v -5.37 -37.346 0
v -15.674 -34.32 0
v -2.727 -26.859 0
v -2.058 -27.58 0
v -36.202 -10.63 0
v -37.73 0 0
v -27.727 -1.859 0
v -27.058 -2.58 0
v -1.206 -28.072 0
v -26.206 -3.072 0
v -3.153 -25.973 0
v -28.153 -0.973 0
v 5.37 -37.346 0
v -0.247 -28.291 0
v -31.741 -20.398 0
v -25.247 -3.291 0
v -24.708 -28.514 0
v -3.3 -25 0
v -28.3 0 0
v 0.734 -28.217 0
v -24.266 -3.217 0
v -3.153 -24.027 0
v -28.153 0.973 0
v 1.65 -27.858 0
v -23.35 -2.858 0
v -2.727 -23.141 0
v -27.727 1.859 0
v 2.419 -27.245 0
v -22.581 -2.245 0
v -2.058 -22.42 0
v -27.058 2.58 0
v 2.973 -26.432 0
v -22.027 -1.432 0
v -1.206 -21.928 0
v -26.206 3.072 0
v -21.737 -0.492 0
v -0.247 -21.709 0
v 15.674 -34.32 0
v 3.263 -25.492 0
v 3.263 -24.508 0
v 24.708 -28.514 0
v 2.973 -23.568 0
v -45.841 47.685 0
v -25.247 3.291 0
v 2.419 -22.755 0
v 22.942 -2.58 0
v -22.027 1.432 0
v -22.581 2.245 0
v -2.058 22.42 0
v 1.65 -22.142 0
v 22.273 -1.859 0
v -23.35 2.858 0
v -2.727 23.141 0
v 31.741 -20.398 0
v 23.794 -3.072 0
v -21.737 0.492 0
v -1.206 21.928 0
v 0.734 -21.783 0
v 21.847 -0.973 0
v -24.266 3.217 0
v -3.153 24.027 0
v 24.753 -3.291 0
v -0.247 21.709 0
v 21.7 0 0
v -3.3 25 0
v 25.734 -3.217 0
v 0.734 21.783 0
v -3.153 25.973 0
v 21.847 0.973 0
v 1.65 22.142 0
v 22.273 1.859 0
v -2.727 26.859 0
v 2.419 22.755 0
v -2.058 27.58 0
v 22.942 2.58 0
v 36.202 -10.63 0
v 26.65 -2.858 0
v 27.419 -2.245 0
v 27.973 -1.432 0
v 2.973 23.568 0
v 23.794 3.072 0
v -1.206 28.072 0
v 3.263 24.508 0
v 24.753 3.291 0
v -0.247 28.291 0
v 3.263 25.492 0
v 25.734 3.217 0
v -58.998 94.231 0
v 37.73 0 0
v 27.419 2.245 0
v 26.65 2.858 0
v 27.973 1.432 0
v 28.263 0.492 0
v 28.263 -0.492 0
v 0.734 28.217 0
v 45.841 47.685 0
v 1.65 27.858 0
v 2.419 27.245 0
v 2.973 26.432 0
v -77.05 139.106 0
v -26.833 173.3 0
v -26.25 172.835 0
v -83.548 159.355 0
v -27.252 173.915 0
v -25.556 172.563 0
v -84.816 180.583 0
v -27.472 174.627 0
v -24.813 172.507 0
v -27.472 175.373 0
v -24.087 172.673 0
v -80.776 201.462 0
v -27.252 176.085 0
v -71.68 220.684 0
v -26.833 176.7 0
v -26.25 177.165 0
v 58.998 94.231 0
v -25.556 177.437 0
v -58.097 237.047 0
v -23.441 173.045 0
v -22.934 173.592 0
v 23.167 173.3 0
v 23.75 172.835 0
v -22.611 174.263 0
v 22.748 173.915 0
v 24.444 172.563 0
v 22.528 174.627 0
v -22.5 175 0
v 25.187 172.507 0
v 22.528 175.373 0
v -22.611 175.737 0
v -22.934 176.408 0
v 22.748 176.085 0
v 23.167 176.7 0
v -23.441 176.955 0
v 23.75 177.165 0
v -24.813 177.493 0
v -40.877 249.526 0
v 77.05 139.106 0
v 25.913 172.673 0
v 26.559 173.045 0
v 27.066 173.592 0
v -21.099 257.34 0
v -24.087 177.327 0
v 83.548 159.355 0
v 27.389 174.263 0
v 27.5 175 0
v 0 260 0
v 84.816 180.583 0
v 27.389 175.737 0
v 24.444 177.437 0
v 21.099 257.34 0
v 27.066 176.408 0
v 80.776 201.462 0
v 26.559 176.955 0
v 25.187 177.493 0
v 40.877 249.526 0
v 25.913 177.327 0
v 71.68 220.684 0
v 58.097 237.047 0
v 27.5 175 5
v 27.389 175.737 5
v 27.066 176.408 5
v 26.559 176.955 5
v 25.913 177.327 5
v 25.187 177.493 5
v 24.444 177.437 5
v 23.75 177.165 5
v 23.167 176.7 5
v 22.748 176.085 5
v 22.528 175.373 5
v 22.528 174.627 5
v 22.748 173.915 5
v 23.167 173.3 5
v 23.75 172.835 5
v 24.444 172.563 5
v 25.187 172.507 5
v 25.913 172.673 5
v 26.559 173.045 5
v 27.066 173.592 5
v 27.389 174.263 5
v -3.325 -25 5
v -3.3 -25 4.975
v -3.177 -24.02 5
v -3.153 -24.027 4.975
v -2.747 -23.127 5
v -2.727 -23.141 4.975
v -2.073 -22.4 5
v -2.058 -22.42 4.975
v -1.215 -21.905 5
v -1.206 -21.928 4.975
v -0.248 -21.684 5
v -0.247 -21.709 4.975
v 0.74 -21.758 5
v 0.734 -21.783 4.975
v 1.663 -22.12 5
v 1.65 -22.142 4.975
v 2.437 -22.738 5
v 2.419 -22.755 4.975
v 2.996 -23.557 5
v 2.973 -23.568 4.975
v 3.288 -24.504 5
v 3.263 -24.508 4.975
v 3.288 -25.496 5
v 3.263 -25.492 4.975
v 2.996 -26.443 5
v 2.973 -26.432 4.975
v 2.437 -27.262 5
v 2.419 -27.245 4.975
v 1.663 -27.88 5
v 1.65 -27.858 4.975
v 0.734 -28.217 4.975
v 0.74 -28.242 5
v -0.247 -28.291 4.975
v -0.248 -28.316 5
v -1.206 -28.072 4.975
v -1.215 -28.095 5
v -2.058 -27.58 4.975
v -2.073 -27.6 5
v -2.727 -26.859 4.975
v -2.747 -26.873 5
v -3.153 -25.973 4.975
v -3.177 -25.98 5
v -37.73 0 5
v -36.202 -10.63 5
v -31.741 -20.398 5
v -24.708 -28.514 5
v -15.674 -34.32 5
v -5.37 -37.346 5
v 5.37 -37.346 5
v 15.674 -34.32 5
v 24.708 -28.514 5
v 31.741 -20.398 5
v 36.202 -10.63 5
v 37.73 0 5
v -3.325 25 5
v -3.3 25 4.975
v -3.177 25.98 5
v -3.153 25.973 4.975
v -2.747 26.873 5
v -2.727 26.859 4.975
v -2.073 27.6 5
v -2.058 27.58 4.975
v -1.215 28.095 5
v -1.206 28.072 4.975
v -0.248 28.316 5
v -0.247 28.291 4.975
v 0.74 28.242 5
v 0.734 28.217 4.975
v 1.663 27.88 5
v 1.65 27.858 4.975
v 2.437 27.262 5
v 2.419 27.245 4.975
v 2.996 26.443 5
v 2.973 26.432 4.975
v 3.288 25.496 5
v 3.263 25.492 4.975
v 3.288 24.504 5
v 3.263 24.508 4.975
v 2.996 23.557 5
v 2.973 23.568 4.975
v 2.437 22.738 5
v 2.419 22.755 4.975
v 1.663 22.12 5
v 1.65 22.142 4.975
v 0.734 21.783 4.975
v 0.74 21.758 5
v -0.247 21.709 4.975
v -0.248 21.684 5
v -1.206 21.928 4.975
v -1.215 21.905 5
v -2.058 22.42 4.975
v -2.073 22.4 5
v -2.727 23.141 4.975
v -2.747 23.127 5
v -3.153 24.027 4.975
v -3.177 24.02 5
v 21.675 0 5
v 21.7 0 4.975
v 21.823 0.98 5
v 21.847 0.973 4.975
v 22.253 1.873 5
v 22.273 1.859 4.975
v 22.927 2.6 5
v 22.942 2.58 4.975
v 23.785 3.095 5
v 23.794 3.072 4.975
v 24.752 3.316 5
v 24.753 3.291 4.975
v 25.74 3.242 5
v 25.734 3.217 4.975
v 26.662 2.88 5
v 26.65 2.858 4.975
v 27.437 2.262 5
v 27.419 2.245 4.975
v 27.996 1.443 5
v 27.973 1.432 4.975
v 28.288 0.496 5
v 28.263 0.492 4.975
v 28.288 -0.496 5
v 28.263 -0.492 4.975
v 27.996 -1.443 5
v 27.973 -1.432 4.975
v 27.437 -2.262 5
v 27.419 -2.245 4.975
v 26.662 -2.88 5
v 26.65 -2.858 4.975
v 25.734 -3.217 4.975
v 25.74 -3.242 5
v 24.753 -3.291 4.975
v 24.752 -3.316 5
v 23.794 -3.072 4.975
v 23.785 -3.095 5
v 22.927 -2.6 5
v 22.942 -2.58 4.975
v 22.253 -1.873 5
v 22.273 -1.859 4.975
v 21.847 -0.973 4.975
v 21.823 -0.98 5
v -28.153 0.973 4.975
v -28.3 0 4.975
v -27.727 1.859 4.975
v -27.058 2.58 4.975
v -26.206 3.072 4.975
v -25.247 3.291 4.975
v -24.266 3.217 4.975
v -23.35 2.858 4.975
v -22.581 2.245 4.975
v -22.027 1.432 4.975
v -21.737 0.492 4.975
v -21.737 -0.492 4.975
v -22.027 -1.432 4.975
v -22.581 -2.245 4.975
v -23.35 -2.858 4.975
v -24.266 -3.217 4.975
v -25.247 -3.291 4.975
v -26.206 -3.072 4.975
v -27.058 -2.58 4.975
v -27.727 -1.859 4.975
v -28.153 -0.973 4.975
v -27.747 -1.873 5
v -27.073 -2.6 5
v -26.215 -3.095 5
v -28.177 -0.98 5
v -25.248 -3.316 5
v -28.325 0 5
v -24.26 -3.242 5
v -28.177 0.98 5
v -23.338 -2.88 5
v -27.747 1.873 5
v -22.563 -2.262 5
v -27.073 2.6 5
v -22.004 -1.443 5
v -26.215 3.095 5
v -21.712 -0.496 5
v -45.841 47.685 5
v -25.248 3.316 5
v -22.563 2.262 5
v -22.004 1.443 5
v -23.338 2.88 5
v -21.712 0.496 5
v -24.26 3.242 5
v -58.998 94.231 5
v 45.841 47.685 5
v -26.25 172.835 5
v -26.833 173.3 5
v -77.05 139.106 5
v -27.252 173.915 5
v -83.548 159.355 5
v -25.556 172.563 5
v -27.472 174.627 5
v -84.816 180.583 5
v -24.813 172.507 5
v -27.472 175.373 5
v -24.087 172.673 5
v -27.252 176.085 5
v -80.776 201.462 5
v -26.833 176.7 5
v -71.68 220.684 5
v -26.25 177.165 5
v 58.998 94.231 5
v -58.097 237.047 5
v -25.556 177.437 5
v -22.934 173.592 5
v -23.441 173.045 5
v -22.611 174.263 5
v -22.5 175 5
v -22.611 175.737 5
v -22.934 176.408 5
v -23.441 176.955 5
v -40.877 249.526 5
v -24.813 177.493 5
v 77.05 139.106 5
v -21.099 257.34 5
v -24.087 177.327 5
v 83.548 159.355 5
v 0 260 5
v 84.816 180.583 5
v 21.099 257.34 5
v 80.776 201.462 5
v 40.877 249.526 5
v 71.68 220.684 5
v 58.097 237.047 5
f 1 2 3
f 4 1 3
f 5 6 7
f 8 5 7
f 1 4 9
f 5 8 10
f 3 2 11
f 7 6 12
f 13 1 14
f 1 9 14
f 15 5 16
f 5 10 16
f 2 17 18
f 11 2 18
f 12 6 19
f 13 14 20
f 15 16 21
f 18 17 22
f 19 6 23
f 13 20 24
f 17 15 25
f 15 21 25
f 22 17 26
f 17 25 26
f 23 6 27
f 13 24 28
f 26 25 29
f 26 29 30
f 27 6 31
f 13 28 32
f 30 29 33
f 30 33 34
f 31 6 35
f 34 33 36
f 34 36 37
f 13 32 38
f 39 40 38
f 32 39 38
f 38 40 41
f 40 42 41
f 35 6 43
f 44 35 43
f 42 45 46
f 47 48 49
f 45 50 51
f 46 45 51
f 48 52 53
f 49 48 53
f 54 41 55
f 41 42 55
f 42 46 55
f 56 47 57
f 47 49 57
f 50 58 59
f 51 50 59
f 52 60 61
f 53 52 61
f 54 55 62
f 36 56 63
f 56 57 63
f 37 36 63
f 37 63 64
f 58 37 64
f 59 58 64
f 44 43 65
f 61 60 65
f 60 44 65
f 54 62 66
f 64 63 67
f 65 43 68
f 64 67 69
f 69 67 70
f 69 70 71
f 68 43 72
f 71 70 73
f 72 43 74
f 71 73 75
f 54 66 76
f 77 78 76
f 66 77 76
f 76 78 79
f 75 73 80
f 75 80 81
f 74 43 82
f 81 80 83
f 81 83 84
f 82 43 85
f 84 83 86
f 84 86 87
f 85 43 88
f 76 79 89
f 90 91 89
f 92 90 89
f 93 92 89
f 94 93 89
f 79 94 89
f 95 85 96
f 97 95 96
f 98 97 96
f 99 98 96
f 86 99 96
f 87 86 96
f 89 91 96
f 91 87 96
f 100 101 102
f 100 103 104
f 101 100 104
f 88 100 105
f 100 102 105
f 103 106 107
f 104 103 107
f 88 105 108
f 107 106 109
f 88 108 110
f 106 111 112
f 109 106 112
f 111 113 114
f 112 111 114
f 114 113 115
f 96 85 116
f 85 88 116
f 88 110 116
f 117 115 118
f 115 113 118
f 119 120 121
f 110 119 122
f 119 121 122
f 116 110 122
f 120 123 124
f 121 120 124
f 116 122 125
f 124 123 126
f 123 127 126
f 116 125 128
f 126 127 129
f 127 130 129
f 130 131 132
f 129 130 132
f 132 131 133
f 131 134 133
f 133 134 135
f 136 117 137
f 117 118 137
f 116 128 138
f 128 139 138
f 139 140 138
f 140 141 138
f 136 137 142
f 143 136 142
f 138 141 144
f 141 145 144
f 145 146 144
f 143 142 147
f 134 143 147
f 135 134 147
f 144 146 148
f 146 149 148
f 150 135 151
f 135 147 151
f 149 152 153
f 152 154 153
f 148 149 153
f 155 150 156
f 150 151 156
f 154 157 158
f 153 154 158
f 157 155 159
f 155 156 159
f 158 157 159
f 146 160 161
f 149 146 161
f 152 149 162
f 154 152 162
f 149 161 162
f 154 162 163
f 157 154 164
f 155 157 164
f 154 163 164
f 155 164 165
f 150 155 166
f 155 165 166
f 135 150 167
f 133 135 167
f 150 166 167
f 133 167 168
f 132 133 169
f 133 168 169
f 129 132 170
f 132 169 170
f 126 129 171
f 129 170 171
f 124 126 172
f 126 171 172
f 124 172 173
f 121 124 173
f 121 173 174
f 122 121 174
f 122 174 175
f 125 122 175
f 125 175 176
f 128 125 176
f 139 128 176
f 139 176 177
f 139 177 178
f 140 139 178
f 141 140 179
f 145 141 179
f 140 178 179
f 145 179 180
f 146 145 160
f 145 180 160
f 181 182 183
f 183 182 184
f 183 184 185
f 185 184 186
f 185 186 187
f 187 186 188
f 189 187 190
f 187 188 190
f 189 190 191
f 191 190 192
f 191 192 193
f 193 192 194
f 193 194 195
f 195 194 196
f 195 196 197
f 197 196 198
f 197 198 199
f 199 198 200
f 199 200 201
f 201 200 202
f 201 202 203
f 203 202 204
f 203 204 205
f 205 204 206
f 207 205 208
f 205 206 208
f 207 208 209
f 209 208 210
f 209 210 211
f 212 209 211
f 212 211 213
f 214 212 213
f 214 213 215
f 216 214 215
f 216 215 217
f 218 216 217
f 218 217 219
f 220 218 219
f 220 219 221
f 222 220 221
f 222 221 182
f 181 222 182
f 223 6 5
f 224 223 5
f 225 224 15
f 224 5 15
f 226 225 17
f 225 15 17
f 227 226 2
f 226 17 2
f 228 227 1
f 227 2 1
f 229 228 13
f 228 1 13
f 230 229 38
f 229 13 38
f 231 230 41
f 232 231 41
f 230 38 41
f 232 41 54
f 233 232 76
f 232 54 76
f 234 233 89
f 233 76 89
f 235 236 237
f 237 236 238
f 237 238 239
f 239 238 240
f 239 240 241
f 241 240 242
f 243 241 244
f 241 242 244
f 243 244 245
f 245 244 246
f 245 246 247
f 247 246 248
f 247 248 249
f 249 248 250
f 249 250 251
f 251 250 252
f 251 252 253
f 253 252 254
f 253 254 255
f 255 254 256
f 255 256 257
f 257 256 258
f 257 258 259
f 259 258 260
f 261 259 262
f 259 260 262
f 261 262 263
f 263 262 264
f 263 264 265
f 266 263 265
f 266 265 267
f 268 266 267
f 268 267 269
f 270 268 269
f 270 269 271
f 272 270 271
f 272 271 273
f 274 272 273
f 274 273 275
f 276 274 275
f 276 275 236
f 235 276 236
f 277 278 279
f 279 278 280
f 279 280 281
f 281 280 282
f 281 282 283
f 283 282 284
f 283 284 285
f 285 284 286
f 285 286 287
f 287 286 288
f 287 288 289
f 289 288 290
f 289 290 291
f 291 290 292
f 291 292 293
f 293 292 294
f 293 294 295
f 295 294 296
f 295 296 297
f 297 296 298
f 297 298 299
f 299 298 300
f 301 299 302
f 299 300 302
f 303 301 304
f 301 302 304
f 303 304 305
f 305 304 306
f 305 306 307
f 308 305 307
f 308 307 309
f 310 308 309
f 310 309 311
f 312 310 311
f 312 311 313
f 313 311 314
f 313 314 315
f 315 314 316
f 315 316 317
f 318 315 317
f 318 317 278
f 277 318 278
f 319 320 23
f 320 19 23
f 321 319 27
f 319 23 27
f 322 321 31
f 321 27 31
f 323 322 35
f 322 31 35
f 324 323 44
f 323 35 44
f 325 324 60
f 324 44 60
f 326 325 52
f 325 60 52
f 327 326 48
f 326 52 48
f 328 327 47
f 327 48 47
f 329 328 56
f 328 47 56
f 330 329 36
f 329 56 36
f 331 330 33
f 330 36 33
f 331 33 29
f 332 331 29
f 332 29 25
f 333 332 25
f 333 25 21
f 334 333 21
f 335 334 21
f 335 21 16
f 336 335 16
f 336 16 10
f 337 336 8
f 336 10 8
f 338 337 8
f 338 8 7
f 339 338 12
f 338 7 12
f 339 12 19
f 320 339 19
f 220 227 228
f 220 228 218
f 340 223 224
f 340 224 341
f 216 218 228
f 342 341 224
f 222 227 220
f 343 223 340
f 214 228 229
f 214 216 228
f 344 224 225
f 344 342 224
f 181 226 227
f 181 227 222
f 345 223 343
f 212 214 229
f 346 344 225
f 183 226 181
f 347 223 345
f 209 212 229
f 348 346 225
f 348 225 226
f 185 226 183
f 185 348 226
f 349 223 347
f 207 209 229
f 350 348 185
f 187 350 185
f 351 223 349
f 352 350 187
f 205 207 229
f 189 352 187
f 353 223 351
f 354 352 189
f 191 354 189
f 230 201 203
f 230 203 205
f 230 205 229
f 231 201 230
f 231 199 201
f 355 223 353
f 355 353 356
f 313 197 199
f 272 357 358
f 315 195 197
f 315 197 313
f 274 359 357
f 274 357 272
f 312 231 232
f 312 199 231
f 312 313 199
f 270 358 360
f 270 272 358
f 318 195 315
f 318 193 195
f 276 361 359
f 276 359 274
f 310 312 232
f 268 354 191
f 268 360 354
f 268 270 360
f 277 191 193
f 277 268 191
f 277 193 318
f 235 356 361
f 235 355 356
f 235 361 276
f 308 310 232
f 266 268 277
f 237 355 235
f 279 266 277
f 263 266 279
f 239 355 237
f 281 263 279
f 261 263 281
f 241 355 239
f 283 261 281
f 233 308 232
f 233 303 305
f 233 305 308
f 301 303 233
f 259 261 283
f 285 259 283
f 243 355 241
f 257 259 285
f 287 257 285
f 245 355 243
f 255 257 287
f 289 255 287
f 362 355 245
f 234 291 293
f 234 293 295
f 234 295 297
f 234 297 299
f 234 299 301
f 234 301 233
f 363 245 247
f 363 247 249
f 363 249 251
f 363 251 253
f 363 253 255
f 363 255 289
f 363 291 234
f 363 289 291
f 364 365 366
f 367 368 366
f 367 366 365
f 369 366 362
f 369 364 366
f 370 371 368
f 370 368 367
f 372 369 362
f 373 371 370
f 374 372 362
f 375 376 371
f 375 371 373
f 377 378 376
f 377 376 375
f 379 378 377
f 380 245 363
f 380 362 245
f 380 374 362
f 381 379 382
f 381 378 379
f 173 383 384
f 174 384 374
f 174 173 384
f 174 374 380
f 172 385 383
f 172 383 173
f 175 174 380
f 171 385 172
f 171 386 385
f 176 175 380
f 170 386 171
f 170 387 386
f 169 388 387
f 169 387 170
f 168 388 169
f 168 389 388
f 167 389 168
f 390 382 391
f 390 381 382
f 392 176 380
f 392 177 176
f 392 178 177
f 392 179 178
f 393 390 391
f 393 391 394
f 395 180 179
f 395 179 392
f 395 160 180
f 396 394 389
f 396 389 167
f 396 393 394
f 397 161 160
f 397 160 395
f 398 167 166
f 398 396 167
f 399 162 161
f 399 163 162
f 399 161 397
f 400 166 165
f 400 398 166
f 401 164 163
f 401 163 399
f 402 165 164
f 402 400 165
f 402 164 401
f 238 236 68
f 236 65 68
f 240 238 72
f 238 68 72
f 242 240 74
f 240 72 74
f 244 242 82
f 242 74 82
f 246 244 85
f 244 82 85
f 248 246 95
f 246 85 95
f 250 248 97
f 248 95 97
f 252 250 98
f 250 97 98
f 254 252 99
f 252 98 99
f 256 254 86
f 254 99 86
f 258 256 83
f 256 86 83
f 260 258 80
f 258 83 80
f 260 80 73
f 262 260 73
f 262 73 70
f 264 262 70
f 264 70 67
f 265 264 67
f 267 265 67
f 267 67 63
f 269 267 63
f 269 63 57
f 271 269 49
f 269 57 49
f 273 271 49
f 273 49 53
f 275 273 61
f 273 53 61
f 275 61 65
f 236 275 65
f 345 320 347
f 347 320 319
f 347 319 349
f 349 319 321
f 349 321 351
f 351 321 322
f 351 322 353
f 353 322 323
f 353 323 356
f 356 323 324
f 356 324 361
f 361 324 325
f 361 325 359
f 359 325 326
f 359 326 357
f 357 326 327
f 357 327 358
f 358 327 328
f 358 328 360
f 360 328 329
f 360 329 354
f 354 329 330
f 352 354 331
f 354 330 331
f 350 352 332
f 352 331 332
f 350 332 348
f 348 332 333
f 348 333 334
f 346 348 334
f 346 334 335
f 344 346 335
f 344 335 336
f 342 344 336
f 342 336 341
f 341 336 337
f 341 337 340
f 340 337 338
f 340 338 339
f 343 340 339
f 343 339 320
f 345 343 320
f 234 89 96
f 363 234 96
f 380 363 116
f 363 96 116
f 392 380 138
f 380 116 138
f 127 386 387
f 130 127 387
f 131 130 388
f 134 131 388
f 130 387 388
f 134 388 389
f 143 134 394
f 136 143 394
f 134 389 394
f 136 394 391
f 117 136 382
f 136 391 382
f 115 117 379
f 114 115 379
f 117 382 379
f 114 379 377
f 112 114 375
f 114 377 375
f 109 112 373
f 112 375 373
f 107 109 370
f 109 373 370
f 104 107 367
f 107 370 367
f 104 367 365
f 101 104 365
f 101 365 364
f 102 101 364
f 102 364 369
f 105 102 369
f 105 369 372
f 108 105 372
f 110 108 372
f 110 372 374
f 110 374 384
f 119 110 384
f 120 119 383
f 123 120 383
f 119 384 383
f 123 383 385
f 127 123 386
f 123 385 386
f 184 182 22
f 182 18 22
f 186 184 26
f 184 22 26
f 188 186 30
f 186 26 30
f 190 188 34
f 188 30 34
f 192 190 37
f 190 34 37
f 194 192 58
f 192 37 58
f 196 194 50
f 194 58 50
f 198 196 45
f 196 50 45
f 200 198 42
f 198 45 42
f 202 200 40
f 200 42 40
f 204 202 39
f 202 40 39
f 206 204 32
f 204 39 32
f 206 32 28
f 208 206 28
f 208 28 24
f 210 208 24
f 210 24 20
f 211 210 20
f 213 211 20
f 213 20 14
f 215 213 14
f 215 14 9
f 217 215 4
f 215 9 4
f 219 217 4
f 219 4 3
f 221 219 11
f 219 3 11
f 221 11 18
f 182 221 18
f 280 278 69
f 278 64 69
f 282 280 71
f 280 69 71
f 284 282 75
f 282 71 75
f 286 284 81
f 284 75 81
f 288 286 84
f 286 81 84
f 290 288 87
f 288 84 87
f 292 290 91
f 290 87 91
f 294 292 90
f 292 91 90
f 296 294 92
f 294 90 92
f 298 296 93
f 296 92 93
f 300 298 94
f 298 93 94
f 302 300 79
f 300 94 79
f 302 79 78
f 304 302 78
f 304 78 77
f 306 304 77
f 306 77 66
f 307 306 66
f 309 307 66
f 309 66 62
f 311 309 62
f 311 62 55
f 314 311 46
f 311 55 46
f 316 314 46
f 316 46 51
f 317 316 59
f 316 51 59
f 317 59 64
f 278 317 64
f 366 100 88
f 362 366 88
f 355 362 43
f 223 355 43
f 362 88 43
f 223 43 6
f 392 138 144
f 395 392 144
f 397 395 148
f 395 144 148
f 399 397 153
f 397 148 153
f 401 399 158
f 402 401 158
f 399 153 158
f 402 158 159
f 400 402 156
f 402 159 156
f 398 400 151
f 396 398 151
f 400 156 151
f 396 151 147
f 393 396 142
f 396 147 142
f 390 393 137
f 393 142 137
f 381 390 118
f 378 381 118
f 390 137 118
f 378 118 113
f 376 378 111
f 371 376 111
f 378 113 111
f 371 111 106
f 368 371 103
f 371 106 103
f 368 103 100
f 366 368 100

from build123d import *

# Parameters (mm, degrees)
BOSS_EXTRUDE4_DEPTH            = 5
M6_CLEARANCE_HOLE1_D           = 6.6
M6_CLEARANCE_HOLE1_CSINK_D     = 6.65
M6_CLEARANCE_HOLE1_CSINK_ANGLE = 90
SKETCH10_R                     = 2.5
CUT_EXTRUDE1_DEPTH             = 5


with BuildPart() as part:
    # Sketch6 → Boss-Extrude4 (new body)
    with BuildSketch(Plane.XY):
        with BuildLine():
            ThreePointArc((37.730032203, 0), (51.79672204, 71.134128832), (77.049643457, 139.106373223))
            ThreePointArc((77.049643457, 139.106373223), (0, 260), (-77.049643457, 139.106373223))
            ThreePointArc((-77.049643457, 139.106373223), (-51.79672204, 71.134128832), (-37.730032203, 0))
            ThreePointArc((-37.730032203, 0), (0, -37.730032203), (37.730032203, 0))
        make_face()
    extrude(amount=BOSS_EXTRUDE4_DEPTH)

    # M6 Clearance Hole1 (through all)
    with Locations(Plane.XY.offset(5)):
        with Locations((0, 25), (25, 0), (0, -25), (-25, 0)):
            CounterSinkHole(M6_CLEARANCE_HOLE1_D / 2, M6_CLEARANCE_HOLE1_CSINK_D / 2, counter_sink_angle=M6_CLEARANCE_HOLE1_CSINK_ANGLE)

    # Sketch10 → Cut-Extrude1 (cut)
    with BuildSketch(Plane.XY.offset(5)):
        with Locations((-25, 175)):
            Circle(SKETCH10_R)
        with Locations((25, 175)):
            Circle(SKETCH10_R)
    extrude(amount=-CUT_EXTRUDE1_DEPTH, mode=Mode.SUBTRACT)


solid = part.part
